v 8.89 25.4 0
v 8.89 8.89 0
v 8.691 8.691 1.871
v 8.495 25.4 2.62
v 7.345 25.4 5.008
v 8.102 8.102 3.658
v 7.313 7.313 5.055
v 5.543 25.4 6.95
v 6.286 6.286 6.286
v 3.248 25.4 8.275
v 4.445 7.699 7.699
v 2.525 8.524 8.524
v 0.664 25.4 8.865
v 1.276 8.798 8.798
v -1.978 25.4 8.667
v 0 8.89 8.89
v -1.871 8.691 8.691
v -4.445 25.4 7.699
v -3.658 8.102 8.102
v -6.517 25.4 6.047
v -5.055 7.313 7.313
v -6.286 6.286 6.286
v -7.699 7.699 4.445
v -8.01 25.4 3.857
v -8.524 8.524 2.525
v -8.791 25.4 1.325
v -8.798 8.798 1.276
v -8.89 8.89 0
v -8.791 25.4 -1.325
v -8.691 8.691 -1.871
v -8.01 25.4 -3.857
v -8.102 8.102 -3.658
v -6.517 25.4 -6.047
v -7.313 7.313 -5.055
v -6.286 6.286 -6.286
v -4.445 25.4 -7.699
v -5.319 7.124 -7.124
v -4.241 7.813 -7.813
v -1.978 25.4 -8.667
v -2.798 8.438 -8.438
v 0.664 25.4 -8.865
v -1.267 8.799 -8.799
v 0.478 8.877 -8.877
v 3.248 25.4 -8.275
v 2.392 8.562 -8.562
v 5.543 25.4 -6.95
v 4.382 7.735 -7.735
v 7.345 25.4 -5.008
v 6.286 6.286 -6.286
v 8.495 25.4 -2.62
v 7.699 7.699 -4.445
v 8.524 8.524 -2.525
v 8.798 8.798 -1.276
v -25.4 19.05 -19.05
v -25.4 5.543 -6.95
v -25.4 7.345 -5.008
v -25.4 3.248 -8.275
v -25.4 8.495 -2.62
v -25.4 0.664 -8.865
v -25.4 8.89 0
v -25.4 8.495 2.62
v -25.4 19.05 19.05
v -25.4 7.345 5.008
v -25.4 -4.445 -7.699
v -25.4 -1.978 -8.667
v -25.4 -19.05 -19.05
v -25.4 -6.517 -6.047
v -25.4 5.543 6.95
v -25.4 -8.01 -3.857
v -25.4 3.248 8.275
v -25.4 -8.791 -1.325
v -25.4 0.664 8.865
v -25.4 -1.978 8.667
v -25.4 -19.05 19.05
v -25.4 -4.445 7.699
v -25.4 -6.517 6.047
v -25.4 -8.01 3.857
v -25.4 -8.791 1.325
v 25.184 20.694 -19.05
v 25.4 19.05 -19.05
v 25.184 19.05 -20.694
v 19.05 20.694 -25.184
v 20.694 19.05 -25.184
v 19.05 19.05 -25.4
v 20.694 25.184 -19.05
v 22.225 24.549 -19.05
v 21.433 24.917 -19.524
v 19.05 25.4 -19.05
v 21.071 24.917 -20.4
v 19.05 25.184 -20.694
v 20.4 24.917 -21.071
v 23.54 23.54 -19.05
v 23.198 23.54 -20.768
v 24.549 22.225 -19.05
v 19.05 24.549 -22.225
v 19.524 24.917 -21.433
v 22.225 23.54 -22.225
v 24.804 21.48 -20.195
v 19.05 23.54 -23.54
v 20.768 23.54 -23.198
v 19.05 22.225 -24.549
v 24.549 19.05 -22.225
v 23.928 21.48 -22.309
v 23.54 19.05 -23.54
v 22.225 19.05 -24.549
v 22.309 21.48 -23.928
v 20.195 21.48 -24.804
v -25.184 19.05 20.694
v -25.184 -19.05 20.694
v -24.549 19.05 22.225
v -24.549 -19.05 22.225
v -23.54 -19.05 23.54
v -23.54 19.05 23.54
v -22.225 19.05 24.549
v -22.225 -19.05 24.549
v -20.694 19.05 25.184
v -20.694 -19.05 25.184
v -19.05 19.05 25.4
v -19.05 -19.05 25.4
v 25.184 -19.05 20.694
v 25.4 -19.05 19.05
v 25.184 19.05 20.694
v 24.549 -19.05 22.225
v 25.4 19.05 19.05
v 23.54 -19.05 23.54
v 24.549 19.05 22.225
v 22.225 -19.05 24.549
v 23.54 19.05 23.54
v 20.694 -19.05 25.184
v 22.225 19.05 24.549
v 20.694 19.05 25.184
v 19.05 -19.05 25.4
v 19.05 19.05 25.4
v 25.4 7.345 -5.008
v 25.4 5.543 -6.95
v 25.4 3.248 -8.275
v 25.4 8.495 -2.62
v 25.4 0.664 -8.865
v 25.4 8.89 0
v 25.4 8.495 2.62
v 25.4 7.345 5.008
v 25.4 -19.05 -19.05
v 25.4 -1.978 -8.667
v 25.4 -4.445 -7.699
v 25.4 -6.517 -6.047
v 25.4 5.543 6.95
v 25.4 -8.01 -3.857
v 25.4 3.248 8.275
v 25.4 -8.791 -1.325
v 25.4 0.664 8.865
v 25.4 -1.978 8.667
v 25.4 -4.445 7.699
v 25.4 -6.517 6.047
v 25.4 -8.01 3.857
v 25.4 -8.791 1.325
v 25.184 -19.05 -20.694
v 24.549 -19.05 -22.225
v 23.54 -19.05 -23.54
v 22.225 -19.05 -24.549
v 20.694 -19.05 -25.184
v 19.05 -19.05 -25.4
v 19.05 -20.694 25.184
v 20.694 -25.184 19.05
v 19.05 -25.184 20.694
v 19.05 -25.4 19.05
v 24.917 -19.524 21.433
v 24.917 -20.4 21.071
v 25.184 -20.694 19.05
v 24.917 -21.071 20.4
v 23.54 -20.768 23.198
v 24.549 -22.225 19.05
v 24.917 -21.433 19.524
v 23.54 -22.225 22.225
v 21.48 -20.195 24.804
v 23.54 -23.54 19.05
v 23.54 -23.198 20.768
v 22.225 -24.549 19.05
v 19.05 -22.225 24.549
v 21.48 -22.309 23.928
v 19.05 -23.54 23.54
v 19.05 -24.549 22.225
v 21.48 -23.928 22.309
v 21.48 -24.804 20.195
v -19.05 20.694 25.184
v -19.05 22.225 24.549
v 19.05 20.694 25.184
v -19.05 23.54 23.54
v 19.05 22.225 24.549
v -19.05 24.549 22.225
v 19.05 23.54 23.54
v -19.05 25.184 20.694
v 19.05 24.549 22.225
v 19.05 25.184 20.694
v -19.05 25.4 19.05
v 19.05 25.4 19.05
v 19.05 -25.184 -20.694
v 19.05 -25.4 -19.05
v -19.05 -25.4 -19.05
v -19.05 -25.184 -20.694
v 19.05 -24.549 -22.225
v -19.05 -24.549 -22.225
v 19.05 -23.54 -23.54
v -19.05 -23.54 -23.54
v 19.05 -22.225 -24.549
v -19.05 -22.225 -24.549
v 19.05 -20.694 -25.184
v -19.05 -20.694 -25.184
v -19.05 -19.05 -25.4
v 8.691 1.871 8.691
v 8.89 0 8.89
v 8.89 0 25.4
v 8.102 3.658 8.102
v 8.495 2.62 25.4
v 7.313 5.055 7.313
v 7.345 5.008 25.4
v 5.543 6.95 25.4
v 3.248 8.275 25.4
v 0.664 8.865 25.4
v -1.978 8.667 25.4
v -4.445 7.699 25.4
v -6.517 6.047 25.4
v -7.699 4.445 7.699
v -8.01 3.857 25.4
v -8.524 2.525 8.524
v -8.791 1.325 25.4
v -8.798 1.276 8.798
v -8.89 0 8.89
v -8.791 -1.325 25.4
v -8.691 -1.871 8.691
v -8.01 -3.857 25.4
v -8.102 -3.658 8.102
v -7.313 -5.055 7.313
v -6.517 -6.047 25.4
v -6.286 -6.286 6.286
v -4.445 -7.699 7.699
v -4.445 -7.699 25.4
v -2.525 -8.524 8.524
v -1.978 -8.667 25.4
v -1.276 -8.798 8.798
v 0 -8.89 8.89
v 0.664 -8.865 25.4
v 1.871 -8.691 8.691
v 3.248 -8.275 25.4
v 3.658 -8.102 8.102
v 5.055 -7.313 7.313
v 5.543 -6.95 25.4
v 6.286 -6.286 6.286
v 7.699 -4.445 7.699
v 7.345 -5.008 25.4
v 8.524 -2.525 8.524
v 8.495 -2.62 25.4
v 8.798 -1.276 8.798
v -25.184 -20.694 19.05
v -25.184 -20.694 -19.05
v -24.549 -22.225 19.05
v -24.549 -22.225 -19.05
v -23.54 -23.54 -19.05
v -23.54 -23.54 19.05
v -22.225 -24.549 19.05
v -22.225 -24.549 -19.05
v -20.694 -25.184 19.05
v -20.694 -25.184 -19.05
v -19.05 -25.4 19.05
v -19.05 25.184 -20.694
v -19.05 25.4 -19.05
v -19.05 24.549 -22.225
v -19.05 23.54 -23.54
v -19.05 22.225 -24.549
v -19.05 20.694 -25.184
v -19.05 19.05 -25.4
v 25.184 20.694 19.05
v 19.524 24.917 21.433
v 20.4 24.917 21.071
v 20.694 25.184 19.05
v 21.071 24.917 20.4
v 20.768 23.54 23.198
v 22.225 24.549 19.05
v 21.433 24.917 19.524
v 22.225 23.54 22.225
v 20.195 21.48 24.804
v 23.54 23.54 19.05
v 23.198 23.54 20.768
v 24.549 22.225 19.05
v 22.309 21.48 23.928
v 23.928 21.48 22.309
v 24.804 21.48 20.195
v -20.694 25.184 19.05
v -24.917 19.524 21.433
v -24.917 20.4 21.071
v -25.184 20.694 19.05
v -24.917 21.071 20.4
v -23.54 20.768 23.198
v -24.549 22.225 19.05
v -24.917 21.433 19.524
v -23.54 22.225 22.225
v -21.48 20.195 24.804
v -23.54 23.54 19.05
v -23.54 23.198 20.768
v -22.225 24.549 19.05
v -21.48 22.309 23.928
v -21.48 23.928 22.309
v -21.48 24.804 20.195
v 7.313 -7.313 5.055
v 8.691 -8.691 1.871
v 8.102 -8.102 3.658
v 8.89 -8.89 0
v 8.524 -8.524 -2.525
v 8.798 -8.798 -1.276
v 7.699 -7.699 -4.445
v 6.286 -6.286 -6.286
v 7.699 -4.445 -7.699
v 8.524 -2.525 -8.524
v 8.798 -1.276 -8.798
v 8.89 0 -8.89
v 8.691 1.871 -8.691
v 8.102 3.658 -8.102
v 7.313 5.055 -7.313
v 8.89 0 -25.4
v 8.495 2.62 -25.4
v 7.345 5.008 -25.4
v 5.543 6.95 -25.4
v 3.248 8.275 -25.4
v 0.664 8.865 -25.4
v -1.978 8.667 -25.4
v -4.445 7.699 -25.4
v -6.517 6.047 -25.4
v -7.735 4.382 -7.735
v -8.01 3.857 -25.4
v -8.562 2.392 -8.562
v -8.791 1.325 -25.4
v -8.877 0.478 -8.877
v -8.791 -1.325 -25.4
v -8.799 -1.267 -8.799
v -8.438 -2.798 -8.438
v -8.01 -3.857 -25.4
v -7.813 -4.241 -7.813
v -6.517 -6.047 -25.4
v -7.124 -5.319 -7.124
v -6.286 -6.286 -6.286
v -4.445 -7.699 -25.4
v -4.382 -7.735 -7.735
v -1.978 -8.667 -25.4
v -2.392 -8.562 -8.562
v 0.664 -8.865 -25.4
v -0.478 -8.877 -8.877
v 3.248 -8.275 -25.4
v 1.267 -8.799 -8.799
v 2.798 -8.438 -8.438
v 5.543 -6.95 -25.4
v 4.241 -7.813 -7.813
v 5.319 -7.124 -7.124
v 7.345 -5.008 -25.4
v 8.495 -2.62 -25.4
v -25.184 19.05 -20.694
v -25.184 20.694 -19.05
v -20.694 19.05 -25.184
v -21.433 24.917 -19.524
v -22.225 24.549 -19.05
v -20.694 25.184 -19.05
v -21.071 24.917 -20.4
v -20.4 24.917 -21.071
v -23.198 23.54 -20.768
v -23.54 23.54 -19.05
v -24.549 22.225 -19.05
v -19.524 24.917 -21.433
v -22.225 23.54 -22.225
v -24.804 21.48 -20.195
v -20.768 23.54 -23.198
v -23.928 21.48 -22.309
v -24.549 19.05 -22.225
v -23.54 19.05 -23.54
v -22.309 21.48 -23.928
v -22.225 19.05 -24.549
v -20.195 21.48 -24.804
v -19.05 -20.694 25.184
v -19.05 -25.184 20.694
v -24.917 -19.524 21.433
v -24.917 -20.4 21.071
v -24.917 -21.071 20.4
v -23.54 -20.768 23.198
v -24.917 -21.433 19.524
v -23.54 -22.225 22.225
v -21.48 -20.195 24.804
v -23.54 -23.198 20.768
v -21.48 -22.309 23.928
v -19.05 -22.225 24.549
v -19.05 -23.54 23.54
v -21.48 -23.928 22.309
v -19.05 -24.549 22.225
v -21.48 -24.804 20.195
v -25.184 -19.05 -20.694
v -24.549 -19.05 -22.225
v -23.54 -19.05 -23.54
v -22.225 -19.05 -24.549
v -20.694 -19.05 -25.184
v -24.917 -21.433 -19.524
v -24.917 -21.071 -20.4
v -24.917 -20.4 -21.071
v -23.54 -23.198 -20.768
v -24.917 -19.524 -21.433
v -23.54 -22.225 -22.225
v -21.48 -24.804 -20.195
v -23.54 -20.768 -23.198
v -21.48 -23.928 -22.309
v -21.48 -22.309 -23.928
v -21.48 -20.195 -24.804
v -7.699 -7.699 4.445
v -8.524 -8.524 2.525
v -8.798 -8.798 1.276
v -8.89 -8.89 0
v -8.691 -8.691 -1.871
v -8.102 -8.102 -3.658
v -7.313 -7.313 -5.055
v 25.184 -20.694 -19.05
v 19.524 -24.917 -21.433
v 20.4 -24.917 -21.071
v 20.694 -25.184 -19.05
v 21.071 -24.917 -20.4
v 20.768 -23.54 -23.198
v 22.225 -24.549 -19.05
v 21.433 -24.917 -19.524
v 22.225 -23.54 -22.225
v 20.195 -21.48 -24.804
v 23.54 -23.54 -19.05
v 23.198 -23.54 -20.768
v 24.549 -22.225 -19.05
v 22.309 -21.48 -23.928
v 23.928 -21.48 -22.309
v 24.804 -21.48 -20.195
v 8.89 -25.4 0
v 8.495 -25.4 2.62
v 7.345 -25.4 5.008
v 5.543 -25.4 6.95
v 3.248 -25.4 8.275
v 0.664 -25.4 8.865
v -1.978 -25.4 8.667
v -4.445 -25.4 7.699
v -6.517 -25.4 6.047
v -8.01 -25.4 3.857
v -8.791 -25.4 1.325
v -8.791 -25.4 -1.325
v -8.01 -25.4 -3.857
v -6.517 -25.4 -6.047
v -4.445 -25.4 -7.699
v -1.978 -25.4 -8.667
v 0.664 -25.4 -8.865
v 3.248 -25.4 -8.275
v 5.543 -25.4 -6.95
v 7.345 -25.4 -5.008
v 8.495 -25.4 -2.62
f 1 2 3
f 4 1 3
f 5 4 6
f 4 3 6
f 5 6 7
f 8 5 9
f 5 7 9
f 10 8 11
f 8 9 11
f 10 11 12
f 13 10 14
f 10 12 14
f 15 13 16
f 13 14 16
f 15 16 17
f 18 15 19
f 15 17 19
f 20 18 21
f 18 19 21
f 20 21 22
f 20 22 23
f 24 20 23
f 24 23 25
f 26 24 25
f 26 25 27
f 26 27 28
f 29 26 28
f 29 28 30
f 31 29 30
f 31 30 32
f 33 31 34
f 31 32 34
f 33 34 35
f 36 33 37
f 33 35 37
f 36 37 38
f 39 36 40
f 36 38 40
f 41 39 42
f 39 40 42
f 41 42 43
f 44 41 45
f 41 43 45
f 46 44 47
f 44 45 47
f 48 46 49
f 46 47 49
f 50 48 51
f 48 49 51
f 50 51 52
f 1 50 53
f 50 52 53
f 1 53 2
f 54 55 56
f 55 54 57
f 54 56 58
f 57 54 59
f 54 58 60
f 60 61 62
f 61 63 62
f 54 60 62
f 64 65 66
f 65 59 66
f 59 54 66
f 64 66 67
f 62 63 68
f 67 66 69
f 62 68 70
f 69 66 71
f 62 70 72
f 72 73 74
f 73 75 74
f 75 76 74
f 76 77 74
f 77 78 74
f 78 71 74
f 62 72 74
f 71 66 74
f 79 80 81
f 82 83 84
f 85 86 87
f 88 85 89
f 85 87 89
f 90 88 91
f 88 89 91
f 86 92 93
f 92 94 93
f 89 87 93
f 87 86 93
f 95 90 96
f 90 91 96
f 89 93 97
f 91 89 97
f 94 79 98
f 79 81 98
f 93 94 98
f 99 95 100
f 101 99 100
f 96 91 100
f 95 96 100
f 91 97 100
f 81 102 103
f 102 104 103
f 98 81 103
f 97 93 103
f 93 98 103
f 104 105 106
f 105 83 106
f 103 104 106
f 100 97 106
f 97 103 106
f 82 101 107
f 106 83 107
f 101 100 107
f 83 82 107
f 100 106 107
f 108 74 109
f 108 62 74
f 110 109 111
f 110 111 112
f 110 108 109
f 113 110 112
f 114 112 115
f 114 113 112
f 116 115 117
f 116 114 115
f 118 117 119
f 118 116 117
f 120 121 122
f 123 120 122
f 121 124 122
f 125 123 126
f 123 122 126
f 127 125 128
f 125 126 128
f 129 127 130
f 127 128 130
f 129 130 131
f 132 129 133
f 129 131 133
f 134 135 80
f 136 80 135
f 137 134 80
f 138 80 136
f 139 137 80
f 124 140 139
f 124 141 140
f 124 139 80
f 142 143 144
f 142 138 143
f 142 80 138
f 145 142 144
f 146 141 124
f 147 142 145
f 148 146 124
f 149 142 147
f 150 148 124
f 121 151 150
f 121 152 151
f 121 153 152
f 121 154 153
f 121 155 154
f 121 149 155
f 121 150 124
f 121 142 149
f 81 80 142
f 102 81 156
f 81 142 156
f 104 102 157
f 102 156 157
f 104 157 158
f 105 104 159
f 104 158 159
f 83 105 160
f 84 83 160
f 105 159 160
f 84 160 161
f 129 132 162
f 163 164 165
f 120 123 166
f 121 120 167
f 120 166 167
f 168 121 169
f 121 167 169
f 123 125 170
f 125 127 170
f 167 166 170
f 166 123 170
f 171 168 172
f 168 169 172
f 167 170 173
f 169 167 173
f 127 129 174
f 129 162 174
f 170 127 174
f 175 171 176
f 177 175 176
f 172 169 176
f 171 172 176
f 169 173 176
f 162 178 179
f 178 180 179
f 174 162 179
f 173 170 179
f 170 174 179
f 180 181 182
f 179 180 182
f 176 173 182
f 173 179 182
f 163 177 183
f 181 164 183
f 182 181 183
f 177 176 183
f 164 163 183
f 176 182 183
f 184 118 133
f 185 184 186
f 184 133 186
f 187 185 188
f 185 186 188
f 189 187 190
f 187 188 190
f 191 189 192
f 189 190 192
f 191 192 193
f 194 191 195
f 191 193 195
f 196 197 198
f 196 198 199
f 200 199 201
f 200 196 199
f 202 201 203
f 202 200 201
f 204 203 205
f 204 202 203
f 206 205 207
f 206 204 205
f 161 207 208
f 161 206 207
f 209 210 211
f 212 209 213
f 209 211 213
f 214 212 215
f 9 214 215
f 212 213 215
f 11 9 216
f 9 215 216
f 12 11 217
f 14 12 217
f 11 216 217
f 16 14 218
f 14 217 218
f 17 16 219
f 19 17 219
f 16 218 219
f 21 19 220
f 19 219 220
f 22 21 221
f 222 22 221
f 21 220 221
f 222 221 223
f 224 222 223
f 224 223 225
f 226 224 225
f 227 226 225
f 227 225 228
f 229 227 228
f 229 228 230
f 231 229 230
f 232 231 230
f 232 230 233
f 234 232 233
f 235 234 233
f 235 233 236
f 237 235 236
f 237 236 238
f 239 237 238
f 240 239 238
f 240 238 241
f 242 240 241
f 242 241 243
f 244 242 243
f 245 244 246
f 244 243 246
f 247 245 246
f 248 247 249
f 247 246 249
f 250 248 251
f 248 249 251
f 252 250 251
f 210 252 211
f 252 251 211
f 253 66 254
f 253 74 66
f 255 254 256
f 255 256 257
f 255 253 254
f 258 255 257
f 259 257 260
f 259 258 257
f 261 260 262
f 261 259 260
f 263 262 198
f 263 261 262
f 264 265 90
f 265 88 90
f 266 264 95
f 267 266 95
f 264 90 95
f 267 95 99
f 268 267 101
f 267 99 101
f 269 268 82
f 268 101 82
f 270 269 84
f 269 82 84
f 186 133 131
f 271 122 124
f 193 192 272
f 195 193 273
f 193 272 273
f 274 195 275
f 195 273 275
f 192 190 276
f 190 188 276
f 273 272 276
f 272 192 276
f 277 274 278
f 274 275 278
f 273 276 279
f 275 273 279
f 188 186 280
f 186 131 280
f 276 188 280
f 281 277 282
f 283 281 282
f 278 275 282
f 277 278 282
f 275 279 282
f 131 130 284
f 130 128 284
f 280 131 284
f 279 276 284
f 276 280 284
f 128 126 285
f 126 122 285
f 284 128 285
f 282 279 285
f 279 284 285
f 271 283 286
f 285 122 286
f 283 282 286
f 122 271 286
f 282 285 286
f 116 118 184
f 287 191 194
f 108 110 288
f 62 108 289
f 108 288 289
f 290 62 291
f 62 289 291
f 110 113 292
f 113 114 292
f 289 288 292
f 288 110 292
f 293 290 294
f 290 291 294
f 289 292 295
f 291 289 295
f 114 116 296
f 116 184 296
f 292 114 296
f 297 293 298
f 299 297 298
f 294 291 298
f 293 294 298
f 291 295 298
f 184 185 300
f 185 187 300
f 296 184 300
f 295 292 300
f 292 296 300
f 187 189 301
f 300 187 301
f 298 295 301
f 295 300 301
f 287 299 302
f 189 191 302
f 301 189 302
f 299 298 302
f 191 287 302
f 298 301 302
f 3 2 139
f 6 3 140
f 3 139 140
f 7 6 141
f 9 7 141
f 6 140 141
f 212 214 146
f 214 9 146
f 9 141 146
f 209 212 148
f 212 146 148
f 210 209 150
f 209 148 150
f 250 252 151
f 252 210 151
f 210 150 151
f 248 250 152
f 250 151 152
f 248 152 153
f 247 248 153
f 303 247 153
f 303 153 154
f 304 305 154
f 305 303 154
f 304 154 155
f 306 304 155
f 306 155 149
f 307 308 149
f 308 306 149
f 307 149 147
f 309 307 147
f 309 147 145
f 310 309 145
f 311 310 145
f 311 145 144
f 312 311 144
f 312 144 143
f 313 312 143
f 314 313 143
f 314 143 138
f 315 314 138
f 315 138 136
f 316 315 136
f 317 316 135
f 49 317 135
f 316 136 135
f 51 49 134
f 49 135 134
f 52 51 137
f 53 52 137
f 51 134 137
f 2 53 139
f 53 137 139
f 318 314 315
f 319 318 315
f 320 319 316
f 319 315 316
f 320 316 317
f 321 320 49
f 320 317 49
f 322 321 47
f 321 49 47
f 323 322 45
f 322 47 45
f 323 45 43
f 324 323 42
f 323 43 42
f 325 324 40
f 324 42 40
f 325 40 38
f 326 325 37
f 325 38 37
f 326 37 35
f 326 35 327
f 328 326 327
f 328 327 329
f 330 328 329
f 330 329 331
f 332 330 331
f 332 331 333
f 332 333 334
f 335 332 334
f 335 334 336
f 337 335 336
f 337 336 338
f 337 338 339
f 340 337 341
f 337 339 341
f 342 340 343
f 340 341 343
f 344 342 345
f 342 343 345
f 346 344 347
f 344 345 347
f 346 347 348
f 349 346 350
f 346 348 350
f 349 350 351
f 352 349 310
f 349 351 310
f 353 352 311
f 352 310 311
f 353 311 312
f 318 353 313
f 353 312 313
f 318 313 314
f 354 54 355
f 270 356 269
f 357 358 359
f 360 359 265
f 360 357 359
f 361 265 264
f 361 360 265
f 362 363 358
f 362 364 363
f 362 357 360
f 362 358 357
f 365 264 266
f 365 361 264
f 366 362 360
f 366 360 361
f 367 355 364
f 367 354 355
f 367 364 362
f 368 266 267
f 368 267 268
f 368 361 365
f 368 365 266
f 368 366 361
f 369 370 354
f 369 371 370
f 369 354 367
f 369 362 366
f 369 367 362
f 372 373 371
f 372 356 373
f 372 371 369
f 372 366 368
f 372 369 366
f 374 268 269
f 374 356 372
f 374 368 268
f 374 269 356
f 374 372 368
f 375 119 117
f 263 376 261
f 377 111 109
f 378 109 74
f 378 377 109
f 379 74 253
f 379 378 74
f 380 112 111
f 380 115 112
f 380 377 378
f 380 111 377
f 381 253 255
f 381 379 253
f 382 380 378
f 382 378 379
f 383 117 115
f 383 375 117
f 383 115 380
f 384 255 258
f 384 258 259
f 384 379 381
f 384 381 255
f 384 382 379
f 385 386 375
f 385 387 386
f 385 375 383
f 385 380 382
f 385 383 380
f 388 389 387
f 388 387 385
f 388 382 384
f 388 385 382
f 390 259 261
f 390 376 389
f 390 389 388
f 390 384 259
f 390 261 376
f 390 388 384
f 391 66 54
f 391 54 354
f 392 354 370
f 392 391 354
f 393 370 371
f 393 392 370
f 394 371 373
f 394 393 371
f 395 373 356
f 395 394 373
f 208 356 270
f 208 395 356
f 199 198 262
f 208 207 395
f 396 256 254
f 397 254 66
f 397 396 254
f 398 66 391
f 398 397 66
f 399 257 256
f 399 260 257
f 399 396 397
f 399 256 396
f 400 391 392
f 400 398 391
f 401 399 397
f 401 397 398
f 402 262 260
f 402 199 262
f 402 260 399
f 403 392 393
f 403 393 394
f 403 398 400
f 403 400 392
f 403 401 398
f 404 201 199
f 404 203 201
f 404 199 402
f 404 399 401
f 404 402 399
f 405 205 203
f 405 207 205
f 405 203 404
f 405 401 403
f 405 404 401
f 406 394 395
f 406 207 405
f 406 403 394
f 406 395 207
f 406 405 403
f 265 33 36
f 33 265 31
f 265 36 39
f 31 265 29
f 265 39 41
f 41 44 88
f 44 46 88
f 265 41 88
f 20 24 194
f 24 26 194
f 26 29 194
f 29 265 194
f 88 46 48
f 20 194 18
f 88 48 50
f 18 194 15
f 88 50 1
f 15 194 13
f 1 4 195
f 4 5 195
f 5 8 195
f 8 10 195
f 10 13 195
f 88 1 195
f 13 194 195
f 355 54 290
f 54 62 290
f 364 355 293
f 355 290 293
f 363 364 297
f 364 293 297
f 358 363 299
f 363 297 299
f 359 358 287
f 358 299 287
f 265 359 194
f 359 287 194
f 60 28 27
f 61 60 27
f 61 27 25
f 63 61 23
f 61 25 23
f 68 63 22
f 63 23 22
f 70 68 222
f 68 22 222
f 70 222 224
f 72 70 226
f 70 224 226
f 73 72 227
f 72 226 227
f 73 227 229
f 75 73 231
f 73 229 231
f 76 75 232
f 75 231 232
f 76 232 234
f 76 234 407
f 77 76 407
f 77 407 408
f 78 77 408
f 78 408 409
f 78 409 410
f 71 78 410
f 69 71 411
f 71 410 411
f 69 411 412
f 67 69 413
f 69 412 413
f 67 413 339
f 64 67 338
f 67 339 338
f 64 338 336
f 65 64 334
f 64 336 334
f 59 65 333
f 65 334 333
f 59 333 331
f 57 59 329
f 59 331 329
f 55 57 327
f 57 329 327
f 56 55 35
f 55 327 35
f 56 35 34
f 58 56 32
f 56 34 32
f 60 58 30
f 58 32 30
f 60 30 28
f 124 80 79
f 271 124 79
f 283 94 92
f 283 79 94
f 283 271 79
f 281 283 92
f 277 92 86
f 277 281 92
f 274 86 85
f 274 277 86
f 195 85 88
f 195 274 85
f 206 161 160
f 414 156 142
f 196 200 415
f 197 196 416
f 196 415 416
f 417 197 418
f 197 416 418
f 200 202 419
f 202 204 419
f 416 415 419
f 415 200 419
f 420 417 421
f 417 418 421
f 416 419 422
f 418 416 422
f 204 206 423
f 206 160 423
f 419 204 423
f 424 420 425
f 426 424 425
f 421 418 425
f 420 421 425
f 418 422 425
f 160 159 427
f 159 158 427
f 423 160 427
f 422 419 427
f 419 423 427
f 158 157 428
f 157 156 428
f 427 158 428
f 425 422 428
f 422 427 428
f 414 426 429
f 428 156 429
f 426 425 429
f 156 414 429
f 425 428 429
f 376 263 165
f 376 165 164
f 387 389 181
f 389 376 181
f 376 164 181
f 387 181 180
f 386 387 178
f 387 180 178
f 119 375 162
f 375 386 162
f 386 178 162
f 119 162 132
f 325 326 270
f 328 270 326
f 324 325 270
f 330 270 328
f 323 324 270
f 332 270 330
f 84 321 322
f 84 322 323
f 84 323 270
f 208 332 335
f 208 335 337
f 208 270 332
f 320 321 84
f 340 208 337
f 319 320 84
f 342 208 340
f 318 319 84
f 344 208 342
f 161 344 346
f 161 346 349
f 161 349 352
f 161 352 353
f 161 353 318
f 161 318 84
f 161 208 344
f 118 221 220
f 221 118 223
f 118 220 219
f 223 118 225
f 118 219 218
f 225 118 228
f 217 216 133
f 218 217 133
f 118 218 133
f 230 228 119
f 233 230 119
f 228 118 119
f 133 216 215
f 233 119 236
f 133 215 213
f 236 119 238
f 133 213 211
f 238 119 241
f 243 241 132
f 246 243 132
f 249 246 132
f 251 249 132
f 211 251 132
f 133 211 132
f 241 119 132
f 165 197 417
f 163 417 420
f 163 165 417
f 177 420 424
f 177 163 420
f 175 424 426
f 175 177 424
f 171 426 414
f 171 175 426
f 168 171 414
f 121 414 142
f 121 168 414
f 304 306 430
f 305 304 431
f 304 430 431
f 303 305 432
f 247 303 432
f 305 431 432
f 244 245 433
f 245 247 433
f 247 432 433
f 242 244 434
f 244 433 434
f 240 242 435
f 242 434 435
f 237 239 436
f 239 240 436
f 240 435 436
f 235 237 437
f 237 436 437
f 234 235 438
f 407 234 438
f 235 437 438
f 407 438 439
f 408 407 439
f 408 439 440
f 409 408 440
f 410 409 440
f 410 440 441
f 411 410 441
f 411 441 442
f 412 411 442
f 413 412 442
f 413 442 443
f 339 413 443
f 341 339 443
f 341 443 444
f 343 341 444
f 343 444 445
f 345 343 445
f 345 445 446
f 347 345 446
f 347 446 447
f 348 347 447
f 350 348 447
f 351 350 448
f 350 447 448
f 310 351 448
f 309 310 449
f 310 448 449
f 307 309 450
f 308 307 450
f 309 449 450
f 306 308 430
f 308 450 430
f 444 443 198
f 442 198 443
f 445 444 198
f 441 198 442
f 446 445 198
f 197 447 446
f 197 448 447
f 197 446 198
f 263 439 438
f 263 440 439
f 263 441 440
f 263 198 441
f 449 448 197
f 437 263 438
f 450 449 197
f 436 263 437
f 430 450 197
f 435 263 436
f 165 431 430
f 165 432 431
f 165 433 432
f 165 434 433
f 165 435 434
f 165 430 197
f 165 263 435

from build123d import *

# Parameters (mm, degrees)
F0_W     = 50.8
F0_H     = 50.8
F1_DEPTH = 25.4
F2_R     = 6.35
F3_R     = 8.89
F4_DEPTH = 50.8
F5_R     = 8.89
F6_DEPTH = 50.8
F7_R     = 8.89
F8_DEPTH = 50.8


with BuildPart() as f1:
    # F0 (on Front) → F1 (new body, symmetric)
    with BuildSketch(Plane.XZ):
        Rectangle(F0_W, F0_H)
    extrude(amount=F1_DEPTH, both=True)

    # F2
    f2_edges = [f1.edges().sort_by_distance(p)[0] for p in [
        (0, -25.4, 25.4),
        (25.4, 0, 25.4),
        (25.4, 0, -25.4),
        (0, -25.4, -25.4),
        (25.4, -25.4, 0),
        (0, 25.4, 25.4),
        (-25.4, 0, 25.4),
        (25.4, 25.4, 0),
        (-25.4, -25.4, 0),
        (-25.4, 0, -25.4),
        (-25.4, 25.4, 0),
        (0, 25.4, -25.4),
    ]]
    fillet(f2_edges, radius=F2_R)

    # F3 (on face) → F4 (cut, through all)
    with BuildSketch(Plane.XY.offset(25.4)):
        Circle(F3_R)
    extrude(amount=-F4_DEPTH, mode=Mode.SUBTRACT)

    # F5 (on face) → F6 (cut, through all)
    with BuildSketch(Plane.XZ.offset(25.4)):
        Circle(F5_R)
    extrude(amount=-F6_DEPTH, mode=Mode.SUBTRACT)

    # F7 (on face) → F8 (cut, through all)
    with BuildSketch(Plane.YZ.offset(25.4)):
        Circle(F7_R)
    extrude(amount=-F8_DEPTH, mode=Mode.SUBTRACT)


solid = f1.part
